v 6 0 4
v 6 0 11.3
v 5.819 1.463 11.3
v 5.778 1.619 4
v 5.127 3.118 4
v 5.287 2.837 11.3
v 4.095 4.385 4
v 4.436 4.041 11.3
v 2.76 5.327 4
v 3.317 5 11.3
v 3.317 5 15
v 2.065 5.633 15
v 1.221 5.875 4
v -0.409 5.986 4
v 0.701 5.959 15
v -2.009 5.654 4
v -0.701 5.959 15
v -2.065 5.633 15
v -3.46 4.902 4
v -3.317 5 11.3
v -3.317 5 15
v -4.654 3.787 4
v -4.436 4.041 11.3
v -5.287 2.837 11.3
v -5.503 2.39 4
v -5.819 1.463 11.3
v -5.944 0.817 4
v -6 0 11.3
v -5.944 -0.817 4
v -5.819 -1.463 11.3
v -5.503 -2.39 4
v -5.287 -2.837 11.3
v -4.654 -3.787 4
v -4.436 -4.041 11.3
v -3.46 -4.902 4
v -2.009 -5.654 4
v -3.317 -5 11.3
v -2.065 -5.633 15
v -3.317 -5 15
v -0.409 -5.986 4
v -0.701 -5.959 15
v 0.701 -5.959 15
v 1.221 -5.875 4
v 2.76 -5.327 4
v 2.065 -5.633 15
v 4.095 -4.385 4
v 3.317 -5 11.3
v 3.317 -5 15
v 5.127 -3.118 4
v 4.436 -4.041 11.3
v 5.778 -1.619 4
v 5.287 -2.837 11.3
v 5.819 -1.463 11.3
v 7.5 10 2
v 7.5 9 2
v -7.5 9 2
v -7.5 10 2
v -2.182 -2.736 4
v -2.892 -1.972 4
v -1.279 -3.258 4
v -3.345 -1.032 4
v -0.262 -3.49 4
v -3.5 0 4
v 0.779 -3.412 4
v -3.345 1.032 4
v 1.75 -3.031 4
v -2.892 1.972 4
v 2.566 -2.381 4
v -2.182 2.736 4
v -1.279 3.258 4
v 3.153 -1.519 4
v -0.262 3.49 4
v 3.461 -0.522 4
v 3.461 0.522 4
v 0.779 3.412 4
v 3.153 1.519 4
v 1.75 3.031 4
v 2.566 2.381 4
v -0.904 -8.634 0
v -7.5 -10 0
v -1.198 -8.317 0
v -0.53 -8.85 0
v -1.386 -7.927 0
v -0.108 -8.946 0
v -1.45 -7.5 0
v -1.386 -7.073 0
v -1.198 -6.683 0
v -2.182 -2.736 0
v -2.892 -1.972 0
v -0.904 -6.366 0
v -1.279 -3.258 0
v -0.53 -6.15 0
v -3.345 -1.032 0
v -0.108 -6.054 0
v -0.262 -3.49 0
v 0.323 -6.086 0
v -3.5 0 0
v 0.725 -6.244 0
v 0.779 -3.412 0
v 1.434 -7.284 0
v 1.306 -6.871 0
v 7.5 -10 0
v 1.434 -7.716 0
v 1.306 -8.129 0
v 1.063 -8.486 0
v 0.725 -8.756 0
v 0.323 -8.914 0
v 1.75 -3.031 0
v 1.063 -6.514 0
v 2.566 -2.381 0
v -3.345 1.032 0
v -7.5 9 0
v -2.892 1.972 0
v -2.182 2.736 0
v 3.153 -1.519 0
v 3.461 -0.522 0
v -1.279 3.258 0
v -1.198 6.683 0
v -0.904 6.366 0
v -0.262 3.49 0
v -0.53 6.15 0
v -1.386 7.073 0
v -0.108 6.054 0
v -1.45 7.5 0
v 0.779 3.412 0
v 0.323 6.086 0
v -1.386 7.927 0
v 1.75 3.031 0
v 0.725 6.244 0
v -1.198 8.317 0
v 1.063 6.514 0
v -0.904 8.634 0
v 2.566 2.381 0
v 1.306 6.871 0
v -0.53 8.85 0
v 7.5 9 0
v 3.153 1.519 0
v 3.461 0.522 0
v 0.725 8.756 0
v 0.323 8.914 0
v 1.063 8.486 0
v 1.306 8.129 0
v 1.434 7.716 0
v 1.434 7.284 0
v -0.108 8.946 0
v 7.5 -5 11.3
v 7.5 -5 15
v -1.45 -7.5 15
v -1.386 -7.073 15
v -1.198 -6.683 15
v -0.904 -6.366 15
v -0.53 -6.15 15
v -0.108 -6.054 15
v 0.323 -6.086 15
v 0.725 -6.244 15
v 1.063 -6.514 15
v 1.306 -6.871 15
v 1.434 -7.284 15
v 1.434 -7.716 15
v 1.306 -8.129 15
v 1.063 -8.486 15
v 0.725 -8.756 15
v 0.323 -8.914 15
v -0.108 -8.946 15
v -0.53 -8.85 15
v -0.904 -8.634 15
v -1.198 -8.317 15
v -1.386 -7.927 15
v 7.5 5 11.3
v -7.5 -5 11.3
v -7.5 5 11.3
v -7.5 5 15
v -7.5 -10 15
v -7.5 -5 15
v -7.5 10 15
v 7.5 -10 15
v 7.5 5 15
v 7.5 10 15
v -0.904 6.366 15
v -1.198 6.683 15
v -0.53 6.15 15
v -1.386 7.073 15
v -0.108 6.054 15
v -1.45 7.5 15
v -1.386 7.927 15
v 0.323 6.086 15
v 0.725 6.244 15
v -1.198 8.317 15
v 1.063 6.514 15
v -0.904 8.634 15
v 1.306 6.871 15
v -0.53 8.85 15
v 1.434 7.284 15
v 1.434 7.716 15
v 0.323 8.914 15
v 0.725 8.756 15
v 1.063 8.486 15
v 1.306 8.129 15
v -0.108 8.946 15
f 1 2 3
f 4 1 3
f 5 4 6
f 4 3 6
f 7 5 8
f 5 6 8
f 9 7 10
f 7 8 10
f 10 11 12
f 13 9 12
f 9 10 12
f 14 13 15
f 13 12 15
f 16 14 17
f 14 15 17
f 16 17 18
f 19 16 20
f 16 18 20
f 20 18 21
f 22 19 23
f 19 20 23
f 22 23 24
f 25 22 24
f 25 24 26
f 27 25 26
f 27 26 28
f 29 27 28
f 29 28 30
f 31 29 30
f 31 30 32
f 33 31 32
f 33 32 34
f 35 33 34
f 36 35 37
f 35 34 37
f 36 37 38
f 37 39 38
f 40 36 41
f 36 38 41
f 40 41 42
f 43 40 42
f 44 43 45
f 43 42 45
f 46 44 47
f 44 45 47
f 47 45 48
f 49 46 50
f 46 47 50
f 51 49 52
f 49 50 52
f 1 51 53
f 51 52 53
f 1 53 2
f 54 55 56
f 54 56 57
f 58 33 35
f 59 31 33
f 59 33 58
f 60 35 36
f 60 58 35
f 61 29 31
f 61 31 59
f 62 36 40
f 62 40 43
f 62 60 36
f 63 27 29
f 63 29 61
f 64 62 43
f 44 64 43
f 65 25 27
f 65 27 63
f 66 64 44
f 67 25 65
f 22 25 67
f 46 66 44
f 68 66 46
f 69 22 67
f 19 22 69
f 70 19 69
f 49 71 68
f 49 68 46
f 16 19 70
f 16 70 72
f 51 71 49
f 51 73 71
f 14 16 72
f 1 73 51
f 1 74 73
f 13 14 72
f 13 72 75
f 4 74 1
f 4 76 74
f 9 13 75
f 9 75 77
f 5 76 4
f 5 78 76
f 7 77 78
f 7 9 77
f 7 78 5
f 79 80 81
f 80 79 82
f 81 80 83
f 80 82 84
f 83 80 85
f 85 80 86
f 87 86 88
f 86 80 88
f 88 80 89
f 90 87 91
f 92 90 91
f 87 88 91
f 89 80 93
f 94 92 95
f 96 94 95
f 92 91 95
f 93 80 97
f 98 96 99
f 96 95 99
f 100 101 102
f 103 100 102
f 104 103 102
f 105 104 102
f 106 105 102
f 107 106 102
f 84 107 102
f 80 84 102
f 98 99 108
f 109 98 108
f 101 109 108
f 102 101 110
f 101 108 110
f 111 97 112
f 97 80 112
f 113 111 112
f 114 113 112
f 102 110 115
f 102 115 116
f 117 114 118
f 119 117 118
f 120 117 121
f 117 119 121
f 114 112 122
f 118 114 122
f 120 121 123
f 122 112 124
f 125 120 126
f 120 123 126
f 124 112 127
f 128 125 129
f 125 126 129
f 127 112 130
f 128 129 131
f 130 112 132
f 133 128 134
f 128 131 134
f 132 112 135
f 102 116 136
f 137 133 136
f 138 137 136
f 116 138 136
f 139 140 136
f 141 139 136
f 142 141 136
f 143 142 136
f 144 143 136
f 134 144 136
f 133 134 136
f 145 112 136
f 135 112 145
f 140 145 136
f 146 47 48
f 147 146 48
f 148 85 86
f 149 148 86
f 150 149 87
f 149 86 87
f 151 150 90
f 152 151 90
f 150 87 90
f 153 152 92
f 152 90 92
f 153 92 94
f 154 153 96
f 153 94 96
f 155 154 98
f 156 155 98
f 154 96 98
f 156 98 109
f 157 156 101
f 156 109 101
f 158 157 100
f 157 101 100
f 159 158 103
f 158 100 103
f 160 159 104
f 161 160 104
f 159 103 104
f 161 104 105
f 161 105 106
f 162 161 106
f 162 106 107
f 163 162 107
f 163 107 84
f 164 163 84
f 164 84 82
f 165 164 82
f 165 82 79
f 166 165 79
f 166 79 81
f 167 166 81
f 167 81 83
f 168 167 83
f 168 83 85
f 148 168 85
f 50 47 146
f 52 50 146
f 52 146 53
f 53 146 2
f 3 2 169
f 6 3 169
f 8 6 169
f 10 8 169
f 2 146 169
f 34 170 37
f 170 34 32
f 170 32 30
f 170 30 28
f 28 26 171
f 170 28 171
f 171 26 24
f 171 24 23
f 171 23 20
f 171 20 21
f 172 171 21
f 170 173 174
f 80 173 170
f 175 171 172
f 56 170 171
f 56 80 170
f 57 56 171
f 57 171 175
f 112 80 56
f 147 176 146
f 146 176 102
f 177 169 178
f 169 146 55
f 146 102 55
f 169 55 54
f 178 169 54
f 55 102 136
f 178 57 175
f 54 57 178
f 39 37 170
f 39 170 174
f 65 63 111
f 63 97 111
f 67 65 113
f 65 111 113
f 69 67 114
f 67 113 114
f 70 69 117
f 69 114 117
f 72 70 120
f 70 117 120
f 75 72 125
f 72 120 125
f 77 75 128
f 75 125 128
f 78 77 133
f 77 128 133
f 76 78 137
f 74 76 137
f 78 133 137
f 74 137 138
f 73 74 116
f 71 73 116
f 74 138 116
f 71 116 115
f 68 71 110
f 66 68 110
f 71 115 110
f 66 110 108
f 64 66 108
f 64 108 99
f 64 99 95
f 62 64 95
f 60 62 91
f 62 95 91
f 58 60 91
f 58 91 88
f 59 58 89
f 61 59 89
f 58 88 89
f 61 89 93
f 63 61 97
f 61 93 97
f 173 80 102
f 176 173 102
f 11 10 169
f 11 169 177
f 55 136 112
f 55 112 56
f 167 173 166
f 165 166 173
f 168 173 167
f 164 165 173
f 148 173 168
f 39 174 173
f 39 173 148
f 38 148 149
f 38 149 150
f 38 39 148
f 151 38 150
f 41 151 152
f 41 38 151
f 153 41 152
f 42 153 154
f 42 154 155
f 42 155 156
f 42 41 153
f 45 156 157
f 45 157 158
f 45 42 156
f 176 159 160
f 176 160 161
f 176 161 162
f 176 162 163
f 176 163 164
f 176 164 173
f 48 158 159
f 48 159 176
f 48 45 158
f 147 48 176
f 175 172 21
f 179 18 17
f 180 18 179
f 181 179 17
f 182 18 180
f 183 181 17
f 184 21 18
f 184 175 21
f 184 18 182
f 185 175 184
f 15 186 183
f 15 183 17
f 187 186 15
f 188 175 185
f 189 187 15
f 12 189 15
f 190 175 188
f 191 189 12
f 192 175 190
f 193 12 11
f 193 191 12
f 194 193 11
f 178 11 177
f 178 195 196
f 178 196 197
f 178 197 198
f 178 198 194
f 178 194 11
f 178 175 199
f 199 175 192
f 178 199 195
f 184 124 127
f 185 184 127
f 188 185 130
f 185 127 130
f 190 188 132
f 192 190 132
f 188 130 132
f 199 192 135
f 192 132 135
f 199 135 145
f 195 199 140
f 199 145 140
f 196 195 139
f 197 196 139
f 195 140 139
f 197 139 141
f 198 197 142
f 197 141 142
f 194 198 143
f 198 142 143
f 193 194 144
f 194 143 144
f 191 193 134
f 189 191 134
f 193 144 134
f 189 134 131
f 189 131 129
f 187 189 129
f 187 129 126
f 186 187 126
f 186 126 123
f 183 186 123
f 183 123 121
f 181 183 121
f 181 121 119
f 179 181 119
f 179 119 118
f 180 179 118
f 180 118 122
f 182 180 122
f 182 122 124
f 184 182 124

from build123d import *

# Parameters (mm, degrees)
F0_W           = 15
F0_H           = 20
F1_DEPTH       = 15
F3_D           = 7
F3_CBORE_D     = 12
F3_CBORE_DEPTH = 11
F4_D           = 2.9
F5_W           = 10
F5_H           = 3.7
F6_DEPTH       = 15.001
F7_W           = 1
F7_H           = 2
F8_DEPTH       = 15.001


with BuildPart() as f1:
    # F0 (on Top) → F1 (new body)
    with BuildSketch(Plane.XY):
        Rectangle(F0_W, F0_H)
    extrude(amount=F1_DEPTH)

    # F3 (through all)
    with Locations(Plane.XY.offset(15)):
        with Locations((0, 0)):
            CounterBoreHole(F3_D / 2, F3_CBORE_D / 2, F3_CBORE_DEPTH)

    # F4 (through all)
    with Locations(Plane.XY.offset(15)):
        with Locations((0, -7.5), (0, 7.5)):
            Hole(F4_D / 2)

    # F5 (on face) → F6 (cut, through all)
    with BuildSketch(Plane.YZ.offset(7.5)):
        with Locations((0, 13.15)):
            Rectangle(F5_W, F5_H)
    extrude(amount=-F6_DEPTH, mode=Mode.SUBTRACT)

    # F7 (on face) → F8 (cut, through all)
    with BuildSketch(Plane.YZ.offset(7.5)):
        with Locations((9.5, 1)):
            Rectangle(F7_W, F7_H)
    extrude(amount=-F8_DEPTH, mode=Mode.SUBTRACT)


solid = f1.part
